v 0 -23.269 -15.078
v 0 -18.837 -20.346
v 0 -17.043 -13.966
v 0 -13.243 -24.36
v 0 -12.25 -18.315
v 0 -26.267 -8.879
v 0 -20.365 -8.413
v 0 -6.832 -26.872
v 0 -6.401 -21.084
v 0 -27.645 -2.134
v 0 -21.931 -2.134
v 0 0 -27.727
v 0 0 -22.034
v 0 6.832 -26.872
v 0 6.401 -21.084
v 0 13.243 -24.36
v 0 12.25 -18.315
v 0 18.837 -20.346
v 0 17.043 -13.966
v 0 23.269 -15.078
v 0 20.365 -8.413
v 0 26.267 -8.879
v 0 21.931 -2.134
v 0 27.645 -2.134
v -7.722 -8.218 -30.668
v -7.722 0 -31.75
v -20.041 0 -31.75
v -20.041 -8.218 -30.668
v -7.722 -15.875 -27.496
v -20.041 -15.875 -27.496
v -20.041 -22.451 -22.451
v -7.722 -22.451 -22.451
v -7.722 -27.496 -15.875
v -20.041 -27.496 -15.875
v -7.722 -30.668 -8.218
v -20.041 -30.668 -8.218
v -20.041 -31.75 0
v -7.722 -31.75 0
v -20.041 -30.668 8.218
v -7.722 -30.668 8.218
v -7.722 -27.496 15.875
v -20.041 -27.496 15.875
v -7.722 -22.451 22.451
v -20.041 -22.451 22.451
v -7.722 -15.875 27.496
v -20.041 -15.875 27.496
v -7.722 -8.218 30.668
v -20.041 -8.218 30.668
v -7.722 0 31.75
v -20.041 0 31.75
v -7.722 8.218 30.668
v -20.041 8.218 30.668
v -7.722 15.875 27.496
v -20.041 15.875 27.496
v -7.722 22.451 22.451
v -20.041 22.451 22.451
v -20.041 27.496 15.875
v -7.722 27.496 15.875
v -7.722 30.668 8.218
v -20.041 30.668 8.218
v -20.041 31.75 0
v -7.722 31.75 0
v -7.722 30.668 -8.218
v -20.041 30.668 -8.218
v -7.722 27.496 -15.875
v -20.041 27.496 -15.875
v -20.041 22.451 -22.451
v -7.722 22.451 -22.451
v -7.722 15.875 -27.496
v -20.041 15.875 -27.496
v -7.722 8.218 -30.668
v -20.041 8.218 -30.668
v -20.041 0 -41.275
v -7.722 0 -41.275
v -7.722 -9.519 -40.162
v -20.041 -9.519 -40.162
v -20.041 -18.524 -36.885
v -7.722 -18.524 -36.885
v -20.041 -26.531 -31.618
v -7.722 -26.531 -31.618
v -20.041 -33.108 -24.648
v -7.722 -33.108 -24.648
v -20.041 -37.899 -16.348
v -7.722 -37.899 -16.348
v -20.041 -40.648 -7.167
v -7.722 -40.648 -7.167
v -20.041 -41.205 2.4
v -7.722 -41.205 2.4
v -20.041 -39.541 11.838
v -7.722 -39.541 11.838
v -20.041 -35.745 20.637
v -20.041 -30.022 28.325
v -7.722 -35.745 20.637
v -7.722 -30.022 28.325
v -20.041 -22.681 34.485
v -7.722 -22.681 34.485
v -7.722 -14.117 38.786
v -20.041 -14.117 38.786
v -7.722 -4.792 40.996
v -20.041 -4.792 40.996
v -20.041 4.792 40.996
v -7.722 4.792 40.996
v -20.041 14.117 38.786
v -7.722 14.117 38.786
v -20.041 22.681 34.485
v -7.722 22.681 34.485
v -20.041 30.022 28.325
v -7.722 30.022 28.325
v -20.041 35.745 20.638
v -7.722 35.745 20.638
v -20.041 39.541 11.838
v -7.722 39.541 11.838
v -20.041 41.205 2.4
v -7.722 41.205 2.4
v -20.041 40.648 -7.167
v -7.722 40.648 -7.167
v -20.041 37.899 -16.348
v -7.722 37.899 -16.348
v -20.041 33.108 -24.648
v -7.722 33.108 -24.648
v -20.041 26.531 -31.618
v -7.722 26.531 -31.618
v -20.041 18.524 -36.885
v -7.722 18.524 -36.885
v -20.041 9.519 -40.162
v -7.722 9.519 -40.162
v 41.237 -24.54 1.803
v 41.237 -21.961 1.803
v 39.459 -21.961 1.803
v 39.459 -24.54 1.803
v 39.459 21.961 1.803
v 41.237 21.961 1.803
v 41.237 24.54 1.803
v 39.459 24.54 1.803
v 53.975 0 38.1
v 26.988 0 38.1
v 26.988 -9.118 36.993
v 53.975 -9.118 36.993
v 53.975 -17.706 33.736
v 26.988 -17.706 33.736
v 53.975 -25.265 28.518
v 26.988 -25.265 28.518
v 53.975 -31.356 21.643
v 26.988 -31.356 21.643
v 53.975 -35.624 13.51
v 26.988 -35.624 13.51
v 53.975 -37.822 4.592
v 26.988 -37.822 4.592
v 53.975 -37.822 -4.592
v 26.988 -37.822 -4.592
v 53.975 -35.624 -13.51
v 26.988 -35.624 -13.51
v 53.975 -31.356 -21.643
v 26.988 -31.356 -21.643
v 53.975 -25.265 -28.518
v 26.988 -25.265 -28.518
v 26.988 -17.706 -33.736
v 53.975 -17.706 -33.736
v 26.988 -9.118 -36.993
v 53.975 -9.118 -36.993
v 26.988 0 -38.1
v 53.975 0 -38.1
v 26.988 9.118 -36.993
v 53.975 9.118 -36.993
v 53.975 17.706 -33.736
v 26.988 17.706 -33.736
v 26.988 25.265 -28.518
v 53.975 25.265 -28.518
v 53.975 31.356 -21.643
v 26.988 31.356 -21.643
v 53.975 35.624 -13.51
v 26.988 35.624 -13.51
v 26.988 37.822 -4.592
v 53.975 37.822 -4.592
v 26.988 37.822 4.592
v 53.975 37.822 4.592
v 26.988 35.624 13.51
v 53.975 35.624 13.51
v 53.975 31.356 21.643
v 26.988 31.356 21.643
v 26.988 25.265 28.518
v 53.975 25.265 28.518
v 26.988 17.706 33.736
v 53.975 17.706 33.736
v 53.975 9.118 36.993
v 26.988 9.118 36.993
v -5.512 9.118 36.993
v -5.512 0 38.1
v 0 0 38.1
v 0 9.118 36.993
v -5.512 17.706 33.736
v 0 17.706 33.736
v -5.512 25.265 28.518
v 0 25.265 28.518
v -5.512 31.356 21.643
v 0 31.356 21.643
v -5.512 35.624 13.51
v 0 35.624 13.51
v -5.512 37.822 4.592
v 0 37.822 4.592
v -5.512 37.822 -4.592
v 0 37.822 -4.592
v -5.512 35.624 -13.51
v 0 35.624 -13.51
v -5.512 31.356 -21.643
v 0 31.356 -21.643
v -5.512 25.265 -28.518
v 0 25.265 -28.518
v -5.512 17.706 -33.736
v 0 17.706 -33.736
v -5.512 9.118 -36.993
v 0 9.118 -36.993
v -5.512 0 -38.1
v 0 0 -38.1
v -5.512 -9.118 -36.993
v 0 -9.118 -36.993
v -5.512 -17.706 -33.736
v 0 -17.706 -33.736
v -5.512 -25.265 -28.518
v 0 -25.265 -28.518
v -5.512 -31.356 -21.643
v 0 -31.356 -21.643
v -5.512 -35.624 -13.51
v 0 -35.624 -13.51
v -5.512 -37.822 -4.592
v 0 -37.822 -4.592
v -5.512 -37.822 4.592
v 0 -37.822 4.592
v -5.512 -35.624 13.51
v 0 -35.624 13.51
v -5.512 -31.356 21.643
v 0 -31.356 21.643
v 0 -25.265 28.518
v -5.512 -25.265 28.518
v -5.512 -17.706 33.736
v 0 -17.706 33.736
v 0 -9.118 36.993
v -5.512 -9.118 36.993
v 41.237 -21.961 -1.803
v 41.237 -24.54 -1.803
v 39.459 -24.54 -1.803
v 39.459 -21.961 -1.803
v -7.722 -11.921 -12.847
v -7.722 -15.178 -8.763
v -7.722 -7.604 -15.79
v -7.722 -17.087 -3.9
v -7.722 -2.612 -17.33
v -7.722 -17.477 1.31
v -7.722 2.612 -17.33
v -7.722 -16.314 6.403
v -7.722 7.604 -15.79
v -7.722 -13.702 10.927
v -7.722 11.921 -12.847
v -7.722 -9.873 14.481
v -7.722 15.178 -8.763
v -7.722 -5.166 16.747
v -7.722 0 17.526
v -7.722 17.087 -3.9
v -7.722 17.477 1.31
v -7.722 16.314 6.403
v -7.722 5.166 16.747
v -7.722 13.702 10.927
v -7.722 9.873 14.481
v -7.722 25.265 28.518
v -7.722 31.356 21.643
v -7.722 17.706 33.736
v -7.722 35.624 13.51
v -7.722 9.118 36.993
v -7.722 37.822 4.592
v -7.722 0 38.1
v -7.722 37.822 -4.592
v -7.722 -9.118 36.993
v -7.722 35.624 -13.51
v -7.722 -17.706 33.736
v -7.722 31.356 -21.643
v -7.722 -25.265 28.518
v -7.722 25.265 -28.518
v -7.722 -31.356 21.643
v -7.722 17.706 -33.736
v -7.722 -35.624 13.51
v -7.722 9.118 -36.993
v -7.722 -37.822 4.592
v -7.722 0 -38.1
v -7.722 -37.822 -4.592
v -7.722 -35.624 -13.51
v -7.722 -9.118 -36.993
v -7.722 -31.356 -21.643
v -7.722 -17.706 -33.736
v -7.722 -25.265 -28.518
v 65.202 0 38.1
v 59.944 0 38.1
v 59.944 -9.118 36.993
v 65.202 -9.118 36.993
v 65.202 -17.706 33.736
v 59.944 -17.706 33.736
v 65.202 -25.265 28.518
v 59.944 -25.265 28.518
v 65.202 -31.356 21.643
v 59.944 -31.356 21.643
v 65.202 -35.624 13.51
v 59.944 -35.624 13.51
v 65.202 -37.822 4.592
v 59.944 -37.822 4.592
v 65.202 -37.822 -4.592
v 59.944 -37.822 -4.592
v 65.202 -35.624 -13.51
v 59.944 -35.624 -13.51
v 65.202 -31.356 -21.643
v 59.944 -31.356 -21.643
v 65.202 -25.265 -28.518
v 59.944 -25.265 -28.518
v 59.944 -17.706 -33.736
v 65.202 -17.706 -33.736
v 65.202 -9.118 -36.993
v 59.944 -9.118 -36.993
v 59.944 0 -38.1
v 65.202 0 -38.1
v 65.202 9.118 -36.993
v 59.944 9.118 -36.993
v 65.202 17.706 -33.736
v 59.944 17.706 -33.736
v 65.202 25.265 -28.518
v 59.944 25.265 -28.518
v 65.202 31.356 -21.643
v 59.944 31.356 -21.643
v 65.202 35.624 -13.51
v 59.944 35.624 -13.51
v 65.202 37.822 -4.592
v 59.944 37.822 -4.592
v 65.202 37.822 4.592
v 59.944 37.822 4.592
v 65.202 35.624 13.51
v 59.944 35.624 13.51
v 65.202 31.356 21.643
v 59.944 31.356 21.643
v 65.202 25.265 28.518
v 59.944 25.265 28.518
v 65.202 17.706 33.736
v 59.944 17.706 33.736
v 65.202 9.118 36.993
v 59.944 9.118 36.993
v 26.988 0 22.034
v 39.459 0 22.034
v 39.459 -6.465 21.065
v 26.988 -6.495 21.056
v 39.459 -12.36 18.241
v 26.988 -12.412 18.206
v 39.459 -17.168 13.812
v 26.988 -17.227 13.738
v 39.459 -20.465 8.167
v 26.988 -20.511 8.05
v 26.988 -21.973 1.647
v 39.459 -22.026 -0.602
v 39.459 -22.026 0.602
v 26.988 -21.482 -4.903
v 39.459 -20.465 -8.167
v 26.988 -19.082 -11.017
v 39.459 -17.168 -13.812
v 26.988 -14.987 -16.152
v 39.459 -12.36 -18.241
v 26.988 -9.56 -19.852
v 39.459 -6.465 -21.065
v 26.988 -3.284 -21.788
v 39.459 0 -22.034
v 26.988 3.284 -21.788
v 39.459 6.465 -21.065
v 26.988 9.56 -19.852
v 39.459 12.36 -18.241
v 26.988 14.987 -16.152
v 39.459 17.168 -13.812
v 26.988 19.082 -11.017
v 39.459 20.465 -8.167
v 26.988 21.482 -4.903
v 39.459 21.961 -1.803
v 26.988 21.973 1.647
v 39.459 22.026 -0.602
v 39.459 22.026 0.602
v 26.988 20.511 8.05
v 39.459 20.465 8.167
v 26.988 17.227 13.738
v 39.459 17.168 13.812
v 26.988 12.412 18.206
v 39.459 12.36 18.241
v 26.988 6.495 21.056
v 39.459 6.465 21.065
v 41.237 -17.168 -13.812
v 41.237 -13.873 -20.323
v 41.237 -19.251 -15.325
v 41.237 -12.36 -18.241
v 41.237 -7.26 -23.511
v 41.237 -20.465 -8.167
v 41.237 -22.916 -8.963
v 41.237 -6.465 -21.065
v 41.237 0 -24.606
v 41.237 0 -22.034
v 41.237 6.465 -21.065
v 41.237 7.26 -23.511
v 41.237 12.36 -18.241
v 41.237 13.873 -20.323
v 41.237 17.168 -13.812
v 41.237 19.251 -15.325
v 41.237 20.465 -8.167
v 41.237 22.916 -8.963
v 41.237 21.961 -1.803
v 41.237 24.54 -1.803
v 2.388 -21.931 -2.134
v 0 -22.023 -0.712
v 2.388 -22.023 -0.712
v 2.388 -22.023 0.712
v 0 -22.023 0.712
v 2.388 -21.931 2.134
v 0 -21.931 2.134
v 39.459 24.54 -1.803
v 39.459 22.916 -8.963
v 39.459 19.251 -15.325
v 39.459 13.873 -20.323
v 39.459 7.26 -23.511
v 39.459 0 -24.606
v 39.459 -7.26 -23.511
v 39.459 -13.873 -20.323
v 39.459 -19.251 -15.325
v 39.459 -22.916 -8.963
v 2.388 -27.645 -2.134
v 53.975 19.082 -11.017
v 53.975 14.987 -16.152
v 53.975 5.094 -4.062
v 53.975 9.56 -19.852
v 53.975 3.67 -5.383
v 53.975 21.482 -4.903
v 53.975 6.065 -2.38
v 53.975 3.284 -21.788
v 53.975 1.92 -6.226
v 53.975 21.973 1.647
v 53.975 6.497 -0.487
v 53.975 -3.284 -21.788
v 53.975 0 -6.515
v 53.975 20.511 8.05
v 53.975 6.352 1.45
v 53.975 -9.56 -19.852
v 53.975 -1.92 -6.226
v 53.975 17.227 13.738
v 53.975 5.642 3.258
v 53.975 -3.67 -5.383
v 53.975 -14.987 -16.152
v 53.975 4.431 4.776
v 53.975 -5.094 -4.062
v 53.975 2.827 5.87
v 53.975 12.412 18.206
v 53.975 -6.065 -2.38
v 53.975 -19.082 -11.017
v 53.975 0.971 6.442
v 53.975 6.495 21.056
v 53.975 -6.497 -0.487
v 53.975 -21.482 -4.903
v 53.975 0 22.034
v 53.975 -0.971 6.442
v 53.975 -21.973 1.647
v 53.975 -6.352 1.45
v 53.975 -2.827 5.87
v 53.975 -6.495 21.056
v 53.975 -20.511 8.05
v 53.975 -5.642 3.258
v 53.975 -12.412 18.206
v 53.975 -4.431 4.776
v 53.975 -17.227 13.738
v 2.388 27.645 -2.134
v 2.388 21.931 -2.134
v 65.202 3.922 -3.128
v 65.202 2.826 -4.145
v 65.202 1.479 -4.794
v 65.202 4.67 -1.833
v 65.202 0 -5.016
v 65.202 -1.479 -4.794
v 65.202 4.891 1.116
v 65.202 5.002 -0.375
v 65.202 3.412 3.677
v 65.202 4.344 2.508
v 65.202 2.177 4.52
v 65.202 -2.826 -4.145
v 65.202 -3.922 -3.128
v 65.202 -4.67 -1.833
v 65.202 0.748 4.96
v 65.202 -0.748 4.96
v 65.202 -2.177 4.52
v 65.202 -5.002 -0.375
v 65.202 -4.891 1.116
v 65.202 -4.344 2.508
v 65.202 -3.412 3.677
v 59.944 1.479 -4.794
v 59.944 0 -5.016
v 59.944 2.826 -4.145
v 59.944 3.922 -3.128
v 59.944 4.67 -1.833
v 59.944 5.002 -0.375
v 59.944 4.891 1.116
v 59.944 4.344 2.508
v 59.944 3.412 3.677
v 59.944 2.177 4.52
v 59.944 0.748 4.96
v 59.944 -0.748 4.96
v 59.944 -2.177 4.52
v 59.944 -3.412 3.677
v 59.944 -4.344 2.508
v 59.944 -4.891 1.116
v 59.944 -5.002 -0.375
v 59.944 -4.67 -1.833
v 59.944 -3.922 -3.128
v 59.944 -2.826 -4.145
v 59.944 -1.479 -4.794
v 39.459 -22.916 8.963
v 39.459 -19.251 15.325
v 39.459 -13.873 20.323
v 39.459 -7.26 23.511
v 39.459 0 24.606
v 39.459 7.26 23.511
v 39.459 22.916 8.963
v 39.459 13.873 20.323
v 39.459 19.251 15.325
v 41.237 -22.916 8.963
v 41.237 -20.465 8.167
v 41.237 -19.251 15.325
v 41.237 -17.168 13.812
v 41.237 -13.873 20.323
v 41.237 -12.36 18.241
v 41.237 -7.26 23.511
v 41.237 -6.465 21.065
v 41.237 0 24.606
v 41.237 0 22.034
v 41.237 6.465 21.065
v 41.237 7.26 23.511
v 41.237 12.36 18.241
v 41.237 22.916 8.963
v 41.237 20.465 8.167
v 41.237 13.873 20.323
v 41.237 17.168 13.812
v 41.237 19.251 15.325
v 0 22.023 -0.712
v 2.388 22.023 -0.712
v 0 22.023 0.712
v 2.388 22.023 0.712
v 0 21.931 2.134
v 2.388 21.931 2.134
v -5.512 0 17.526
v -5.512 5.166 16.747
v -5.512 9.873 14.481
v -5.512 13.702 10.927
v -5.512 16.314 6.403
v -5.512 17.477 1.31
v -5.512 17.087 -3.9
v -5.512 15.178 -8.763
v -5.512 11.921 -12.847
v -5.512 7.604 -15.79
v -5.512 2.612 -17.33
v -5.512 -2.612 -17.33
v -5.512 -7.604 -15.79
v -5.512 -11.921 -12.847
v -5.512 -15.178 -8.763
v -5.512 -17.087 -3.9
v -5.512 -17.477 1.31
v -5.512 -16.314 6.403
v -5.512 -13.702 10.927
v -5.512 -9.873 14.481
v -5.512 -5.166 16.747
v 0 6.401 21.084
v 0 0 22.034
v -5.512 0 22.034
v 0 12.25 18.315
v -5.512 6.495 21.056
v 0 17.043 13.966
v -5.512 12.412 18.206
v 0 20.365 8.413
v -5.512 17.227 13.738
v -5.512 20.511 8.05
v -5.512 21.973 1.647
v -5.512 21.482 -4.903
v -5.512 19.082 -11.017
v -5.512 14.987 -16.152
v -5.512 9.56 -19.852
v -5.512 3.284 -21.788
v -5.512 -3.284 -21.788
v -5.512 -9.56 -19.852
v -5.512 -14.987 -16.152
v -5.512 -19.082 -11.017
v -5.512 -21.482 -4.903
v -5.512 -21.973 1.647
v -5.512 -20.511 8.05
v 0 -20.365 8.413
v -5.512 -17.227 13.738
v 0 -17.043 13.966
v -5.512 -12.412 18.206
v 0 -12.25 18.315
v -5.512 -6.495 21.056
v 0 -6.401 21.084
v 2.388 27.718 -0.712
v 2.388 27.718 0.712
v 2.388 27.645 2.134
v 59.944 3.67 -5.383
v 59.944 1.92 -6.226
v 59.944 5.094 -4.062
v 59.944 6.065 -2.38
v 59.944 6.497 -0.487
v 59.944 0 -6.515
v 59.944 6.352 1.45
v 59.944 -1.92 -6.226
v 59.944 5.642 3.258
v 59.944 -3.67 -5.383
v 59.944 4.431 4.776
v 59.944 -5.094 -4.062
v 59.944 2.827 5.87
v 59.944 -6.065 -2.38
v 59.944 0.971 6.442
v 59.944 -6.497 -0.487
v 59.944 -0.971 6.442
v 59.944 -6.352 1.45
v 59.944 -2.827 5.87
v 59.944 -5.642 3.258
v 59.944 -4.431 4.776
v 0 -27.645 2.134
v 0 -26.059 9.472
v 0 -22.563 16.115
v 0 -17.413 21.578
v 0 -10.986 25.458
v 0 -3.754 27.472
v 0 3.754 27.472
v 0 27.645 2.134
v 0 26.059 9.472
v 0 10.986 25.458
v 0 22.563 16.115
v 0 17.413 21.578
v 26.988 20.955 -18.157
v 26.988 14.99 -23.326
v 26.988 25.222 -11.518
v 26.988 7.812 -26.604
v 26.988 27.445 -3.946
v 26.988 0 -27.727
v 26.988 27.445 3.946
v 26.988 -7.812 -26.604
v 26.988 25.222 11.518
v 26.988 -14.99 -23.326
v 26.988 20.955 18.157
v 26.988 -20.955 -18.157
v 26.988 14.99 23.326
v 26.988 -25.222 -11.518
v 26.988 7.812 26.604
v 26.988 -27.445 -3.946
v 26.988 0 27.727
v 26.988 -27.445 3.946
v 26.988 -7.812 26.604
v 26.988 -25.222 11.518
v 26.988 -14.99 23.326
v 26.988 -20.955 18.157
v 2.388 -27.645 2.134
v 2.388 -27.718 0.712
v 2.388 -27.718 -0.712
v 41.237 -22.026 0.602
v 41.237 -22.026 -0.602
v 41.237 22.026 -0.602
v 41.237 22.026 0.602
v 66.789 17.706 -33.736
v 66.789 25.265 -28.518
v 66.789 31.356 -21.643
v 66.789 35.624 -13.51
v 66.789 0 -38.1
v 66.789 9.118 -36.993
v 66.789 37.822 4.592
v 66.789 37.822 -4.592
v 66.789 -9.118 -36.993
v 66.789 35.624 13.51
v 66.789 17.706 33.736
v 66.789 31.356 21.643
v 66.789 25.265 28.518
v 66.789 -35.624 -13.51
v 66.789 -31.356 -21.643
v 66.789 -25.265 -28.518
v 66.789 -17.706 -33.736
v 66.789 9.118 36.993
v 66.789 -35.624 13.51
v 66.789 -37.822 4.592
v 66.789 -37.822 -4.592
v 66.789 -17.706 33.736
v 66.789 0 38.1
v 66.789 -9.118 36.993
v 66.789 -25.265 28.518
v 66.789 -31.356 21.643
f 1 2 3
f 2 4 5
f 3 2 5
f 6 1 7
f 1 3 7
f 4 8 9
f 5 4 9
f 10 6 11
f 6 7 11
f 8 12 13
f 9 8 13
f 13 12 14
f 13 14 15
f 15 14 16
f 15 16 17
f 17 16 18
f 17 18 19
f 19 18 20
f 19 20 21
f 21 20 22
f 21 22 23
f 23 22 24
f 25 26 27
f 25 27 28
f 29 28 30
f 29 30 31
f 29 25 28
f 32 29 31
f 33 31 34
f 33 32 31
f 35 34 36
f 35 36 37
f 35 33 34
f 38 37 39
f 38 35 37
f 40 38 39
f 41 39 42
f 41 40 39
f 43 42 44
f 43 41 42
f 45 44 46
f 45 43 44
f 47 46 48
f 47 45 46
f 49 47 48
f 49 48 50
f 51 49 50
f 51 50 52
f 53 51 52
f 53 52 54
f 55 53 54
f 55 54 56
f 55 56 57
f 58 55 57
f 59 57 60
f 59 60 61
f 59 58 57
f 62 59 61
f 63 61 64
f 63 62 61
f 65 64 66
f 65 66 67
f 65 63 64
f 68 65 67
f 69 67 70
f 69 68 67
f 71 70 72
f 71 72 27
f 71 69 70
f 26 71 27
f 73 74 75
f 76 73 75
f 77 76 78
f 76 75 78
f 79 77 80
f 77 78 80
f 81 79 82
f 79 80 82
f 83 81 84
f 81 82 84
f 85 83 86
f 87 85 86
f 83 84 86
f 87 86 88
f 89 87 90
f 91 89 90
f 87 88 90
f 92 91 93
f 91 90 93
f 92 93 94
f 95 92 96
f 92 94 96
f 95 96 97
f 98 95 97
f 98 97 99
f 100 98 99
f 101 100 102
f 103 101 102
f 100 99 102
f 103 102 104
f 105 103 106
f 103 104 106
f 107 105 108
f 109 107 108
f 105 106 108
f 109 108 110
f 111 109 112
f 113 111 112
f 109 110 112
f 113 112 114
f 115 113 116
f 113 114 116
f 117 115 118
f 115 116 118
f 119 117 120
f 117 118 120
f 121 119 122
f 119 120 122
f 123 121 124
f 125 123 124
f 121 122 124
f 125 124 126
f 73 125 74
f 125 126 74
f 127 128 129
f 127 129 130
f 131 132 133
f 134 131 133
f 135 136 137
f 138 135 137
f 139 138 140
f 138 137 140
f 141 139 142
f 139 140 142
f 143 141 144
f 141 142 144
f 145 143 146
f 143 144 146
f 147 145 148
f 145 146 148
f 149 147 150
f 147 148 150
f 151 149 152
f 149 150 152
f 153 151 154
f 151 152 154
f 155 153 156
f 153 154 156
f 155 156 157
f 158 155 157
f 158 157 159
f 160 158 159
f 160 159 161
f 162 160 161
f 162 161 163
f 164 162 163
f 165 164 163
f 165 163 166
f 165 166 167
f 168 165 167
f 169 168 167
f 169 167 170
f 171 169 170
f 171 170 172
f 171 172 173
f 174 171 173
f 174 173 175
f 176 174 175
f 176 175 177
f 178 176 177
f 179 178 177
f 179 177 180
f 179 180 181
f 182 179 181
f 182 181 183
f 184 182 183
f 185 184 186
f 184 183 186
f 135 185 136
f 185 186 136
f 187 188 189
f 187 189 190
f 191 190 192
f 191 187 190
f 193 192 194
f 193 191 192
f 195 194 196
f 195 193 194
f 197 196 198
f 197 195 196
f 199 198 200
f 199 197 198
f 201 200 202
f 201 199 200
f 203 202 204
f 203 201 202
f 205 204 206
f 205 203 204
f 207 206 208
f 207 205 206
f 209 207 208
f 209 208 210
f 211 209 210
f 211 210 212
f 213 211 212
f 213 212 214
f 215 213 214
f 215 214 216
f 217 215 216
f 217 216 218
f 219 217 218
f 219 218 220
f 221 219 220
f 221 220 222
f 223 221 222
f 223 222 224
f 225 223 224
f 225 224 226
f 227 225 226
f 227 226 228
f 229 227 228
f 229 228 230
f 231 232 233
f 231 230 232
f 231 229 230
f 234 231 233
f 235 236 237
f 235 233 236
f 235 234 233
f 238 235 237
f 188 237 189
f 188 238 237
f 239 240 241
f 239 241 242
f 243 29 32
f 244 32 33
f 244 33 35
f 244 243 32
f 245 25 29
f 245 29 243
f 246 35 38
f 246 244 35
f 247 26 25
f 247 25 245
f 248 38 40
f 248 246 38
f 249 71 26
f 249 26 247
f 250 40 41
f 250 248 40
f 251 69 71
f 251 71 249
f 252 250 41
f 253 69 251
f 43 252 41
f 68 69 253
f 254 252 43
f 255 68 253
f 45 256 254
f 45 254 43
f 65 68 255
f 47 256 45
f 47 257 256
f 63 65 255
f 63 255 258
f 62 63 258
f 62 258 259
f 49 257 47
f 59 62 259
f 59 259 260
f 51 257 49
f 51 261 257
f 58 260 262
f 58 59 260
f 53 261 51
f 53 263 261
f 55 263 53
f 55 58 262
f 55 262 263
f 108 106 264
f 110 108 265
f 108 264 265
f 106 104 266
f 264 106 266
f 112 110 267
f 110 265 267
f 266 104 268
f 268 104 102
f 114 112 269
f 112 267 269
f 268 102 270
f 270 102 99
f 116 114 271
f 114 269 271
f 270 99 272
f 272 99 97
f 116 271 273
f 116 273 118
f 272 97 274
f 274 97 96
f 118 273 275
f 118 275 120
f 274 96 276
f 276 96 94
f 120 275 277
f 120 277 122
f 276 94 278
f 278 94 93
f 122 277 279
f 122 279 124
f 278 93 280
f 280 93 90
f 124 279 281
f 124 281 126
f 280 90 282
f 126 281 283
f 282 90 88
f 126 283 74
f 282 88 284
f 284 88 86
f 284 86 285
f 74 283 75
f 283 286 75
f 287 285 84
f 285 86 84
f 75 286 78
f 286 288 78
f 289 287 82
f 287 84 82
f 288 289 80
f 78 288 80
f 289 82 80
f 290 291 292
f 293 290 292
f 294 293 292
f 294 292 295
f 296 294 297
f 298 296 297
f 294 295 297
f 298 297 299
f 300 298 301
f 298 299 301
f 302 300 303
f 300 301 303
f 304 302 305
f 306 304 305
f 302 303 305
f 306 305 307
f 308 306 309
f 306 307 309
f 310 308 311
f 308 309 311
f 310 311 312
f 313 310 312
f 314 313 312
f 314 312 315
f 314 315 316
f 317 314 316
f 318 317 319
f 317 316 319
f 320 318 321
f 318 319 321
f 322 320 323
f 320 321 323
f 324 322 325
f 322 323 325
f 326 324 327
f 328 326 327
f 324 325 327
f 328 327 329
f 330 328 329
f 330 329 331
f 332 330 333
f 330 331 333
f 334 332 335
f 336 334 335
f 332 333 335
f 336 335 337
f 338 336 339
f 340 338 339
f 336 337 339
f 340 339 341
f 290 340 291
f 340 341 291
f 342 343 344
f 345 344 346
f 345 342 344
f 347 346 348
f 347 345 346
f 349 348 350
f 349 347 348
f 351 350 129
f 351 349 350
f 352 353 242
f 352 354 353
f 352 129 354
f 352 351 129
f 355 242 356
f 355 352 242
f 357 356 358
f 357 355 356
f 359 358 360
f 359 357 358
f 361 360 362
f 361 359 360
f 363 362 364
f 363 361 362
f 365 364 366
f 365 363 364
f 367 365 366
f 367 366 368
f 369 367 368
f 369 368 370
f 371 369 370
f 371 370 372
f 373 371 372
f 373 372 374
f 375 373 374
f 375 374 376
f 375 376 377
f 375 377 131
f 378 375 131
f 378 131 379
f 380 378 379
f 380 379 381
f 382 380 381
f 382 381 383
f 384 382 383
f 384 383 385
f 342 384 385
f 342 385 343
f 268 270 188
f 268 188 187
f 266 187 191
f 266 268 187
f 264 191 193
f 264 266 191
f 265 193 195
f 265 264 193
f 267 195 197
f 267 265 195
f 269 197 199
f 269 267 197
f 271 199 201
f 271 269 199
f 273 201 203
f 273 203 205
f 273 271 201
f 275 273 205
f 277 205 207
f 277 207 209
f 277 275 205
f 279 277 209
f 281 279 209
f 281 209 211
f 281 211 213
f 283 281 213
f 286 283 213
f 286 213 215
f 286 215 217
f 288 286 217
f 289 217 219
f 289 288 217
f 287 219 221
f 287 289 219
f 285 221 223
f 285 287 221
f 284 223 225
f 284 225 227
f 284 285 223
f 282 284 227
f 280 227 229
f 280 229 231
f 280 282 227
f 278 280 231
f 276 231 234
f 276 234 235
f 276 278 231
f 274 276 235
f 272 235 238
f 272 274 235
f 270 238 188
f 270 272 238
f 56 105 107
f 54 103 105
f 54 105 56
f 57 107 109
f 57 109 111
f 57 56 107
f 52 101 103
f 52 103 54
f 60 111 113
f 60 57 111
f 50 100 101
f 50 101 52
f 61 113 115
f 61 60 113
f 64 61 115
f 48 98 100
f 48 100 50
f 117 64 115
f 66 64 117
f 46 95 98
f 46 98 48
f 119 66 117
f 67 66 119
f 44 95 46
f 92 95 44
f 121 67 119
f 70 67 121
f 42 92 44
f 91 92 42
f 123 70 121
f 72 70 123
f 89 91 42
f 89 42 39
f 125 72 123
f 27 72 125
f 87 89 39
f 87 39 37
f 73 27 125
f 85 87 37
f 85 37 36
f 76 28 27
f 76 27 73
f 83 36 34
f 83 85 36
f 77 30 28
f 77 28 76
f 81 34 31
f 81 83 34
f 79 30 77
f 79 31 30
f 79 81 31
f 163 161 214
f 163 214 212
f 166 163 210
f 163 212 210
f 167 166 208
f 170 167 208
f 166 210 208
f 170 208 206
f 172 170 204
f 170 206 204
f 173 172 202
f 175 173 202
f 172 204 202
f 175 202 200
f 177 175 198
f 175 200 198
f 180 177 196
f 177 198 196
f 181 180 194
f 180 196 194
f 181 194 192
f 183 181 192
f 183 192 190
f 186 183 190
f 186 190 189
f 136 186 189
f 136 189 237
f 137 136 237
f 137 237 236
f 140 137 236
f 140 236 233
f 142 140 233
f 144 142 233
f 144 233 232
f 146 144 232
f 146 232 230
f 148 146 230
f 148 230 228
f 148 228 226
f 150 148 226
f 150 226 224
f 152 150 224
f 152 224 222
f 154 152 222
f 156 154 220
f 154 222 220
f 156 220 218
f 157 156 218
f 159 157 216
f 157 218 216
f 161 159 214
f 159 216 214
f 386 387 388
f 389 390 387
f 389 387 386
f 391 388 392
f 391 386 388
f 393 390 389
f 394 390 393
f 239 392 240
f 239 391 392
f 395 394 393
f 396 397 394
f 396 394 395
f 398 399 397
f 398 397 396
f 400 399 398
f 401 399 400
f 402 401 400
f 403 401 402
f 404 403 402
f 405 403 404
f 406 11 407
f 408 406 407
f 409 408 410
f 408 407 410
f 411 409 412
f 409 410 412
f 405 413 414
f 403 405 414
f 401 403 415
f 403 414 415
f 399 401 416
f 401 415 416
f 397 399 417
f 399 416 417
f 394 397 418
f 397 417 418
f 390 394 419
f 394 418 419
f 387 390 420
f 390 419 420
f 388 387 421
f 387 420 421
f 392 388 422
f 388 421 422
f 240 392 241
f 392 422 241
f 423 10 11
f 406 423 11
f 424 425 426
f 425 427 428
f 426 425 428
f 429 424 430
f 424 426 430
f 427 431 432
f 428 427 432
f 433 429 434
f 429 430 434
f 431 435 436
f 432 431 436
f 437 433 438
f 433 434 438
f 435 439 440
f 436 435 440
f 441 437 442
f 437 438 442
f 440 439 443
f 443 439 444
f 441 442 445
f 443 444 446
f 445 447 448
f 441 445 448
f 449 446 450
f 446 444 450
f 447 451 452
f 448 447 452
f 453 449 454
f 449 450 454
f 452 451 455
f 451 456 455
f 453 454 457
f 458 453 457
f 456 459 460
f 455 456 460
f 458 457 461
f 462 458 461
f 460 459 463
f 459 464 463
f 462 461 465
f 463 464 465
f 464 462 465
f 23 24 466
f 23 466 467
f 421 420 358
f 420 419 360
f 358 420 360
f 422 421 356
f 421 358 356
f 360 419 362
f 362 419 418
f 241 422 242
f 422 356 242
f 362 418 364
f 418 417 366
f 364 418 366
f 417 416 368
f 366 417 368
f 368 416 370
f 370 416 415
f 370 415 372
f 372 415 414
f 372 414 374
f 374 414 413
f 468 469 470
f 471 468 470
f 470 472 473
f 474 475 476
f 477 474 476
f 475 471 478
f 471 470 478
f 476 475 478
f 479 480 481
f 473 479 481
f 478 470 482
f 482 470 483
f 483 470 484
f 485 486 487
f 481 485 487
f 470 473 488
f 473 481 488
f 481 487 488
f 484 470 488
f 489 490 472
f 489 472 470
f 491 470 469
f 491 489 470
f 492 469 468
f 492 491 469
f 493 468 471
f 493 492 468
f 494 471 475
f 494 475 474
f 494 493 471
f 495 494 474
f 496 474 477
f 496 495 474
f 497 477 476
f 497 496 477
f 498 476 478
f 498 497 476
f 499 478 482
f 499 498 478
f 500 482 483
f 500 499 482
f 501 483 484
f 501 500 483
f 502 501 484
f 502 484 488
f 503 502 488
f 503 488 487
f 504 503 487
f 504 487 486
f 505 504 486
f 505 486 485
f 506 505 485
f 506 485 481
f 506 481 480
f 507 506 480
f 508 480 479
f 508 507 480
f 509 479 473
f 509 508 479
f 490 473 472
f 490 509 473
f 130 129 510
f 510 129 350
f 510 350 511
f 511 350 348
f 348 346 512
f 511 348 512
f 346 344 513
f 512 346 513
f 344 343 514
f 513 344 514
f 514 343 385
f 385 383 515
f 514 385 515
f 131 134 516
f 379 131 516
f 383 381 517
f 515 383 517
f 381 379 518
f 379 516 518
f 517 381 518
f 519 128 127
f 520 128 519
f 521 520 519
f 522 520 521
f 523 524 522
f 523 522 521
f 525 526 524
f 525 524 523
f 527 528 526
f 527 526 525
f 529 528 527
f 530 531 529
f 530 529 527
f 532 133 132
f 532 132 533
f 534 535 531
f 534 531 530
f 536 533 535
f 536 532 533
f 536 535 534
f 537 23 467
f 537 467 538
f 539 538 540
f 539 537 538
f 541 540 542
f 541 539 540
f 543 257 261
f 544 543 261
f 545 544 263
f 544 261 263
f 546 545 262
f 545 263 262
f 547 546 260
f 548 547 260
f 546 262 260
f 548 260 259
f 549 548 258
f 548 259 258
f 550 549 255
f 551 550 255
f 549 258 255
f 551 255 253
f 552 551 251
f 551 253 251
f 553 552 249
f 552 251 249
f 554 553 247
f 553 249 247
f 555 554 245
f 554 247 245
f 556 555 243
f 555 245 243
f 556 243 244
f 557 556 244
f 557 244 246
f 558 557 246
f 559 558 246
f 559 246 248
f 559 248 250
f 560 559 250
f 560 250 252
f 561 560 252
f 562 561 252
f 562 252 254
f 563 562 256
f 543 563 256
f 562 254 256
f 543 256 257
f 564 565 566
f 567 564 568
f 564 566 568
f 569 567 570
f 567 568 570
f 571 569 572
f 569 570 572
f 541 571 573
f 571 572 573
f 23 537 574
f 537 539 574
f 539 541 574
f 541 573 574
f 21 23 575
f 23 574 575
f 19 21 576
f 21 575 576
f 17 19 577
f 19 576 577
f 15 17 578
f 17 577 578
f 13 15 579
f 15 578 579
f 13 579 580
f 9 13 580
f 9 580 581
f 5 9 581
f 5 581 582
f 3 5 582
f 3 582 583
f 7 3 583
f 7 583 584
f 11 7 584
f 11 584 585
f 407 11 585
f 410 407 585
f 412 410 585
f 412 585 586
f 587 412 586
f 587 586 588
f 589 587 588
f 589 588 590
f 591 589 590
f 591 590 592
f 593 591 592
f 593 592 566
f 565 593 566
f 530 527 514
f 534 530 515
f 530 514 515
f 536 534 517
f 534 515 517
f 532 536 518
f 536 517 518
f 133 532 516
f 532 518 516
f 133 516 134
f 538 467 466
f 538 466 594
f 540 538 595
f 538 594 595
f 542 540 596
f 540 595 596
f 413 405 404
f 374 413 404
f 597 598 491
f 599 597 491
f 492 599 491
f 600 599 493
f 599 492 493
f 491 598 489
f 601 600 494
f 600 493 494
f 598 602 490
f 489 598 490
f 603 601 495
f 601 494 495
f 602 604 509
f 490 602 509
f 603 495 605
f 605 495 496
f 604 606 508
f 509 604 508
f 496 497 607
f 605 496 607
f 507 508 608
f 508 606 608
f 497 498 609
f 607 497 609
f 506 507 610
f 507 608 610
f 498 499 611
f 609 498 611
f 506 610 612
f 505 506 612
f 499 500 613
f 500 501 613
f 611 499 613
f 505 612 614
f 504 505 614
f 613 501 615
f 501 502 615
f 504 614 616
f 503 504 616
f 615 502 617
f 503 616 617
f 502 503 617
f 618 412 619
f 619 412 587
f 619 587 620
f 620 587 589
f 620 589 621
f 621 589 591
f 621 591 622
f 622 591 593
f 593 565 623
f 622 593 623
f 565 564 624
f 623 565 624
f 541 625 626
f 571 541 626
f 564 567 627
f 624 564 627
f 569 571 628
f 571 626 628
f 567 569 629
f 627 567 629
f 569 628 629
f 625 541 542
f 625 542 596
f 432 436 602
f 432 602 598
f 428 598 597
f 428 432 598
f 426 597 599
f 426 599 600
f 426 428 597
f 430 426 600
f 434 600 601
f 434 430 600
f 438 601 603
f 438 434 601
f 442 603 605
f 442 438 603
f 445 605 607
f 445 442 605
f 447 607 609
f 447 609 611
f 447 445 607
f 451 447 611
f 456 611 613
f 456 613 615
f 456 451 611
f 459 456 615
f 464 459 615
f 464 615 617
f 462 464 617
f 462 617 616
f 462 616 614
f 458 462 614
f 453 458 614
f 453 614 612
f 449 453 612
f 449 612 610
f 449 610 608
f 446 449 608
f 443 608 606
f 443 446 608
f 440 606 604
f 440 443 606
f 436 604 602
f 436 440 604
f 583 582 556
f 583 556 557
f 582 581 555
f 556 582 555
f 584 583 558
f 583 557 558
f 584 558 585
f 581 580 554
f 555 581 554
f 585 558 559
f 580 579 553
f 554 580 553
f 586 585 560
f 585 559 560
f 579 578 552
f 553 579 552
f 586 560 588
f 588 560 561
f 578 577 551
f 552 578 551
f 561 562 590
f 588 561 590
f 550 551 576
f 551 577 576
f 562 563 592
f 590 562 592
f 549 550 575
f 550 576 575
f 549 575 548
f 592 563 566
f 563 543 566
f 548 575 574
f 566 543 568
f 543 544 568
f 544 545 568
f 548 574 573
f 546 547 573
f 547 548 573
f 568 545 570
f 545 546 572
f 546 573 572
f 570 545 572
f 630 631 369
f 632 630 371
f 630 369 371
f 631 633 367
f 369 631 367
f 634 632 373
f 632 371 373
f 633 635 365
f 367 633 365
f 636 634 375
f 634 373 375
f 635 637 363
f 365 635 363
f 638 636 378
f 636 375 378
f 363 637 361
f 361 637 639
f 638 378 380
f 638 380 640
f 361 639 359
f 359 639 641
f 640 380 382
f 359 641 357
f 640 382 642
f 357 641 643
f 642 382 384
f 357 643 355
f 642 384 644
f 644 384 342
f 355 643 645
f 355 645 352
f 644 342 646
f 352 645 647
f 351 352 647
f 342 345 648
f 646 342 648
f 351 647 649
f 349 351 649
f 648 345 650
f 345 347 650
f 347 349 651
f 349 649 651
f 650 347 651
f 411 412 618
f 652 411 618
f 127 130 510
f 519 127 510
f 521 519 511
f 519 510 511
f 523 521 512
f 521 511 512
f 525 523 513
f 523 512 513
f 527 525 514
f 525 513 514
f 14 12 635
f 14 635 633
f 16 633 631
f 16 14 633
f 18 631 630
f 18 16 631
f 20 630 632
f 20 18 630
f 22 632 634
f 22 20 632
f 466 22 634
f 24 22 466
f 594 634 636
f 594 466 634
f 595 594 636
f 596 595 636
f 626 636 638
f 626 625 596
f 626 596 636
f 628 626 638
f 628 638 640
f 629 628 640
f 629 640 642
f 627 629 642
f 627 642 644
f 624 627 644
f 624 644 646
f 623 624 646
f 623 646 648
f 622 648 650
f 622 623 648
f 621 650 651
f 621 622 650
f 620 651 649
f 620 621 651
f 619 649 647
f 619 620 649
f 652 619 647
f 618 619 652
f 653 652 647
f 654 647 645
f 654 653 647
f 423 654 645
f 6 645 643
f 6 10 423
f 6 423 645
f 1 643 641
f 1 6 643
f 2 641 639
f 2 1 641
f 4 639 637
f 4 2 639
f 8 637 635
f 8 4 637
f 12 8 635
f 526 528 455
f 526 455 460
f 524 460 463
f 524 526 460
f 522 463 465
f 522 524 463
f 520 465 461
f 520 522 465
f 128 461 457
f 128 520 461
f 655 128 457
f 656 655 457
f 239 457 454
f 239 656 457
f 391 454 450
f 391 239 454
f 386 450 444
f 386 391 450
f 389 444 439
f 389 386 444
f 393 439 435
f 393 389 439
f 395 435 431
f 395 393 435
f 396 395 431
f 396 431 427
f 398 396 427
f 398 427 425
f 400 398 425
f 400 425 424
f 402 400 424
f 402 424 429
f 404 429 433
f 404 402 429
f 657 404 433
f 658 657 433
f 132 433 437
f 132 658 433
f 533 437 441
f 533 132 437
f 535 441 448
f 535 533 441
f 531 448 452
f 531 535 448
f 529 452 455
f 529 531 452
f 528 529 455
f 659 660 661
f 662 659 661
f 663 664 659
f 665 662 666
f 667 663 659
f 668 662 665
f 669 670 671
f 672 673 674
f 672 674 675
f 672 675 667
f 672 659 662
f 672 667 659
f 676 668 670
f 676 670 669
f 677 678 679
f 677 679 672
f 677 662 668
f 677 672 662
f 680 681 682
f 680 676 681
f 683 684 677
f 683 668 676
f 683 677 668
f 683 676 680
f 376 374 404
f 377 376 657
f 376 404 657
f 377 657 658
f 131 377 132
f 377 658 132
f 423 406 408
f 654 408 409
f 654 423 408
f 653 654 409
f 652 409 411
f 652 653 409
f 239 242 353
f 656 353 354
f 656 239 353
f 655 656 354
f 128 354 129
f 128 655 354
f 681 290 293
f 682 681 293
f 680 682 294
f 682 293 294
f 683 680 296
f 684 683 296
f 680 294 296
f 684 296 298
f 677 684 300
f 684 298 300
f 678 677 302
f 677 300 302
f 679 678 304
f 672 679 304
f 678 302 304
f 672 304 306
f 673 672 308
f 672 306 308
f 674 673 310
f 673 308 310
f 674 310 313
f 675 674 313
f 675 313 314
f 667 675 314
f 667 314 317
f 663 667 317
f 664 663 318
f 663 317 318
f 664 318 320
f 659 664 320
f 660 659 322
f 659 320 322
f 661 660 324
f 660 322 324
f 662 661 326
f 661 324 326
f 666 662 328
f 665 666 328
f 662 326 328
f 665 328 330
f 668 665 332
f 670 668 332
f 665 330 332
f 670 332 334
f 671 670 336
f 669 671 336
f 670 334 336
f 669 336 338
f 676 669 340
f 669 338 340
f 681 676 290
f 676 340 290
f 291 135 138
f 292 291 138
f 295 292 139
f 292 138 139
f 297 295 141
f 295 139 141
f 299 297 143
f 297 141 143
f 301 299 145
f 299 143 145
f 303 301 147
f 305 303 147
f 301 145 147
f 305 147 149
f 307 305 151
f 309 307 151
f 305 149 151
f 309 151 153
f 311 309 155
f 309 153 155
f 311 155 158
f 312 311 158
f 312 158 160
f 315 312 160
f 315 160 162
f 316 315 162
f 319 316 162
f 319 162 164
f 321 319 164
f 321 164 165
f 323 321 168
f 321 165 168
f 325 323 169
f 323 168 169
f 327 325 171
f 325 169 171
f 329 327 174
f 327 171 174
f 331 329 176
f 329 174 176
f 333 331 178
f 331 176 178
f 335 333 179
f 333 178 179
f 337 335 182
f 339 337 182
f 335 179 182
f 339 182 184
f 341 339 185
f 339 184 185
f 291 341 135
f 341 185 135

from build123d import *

# Parameters (mm, degrees)
SKETCH1_R            = 38.1
SKETCH1_R_2          = 27.727172307
BOSS_EXTRUDE1_DEPTH  = 26.9875
BOSS_EXTRUDE2_START  = 5.5118
SKETCH2_R            = 38.1
SKETCH2_R_2          = 22.0345
BOSS_EXTRUDE2_DEPTH  = 5.5118
SKETCH3_R            = 38.1
SKETCH3_R_2          = 22.0345
BOSS_EXTRUDE3_DEPTH  = 26.9875
BOSS_EXTRUDE4_DEPTH  = 2.3876
BOSS_EXTRUDE5_START  = 2.2098
SKETCH5_R            = 38.1
SKETCH5_R_2          = 17.526
BOSS_EXTRUDE5_DEPTH  = 2.2098
SKETCH7_R            = 24.60625
CUT_EXTRUDE1_DEPTH   = 1.778
SKETCH8_R            = 38.1
SKETCH8_R_2          = 6.5151
BOSS_EXTRUDE6_DEPTH  = 5.969
SKETCH9_R            = 38.1
SKETCH9_R_2          = 5.0165
BOSS_EXTRUDE7_DEPTH  = 5.2578
SKETCH10_R           = 38.1
BOSS_EXTRUDE8_DEPTH  = 1.5875
BOSS_EXTRUDE9_REACH  = 74.802
SKETCH12_R           = 41.275
SKETCH12_R_2         = 31.75
BOSS_EXTRUDE10_DEPTH = 12.319


with BuildPart() as part:
    # Sketch1 → Boss-Extrude1 (new body)
    with BuildSketch(Plane(origin=(0, 0, 0), x_dir=(0, 0, -1), z_dir=(1, 0, 0))):
        Circle(SKETCH1_R)
        Circle(SKETCH1_R_2, mode=Mode.SUBTRACT)
    extrude(amount=BOSS_EXTRUDE1_DEPTH)

    # Sketch2 → Boss-Extrude2 (add)
    with BuildSketch(Plane.ZY.offset(BOSS_EXTRUDE2_START)):
        Circle(SKETCH2_R)
        Circle(SKETCH2_R_2, mode=Mode.SUBTRACT)
    extrude(amount=-BOSS_EXTRUDE2_DEPTH)

    # Sketch3 → Boss-Extrude3 (add)
    with BuildSketch(Plane(origin=(26.9875, 0, 0), x_dir=(0, 0, -1), z_dir=(1, 0, 0))):
        with Locations(Location((0, 0, 0), (0, 0, 180))):
            Circle(SKETCH3_R)
        with Locations(Location((0, 0, 0), (0, 0, 180))):
            Circle(SKETCH3_R_2, mode=Mode.SUBTRACT)
    extrude(amount=BOSS_EXTRUDE3_DEPTH)

    # Sketch4 → Boss-Extrude4 (add)
    with BuildSketch(Plane(origin=(0, 0, 0), x_dir=(0, 0, -1), z_dir=(1, 0, 0))):
        with BuildLine():
            Line((-2.1336, 21.930958513), (-2.1336, 27.727172307))
            Line((-2.1336, 27.727172307), (2.1336, 27.727172307))
            Line((2.1336, 27.727172307), (2.1336, 21.930958513))
            ThreePointArc((2.1336, 21.930958513), (0, 22.0345), (-2.1336, 21.930958513))
        make_face()
    boss_extrude4 = extrude(amount=BOSS_EXTRUDE4_DEPTH)

    # Mirror1: Boss-Extrude4 across plane
    add(boss_extrude4.mirror(Plane.ZX))

    # Sketch5 → Boss-Extrude5 (add)
    with BuildSketch(Plane.ZY.offset(5.5118).offset(BOSS_EXTRUDE5_START)):
        Circle(SKETCH5_R)
        Circle(SKETCH5_R_2, mode=Mode.SUBTRACT)
    extrude(amount=-BOSS_EXTRUDE5_DEPTH)

    # Sketch7 → Cut-Extrude1 (cut)
    with BuildSketch(Plane.ZY.offset(-39.4589)):
        Circle(SKETCH7_R)
    extrude(amount=-CUT_EXTRUDE1_DEPTH, mode=Mode.SUBTRACT)

    # Sketch8 → Boss-Extrude6 (add)
    with BuildSketch(Plane(origin=(53.975, 0, 0), x_dir=(0, 0, -1), z_dir=(1, 0, 0))):
        with Locations(Location((0, 0, 0), (0, 0, 180))):
            Circle(SKETCH8_R)
        Circle(SKETCH8_R_2, mode=Mode.SUBTRACT)
    extrude(amount=BOSS_EXTRUDE6_DEPTH)

    # Sketch9 → Boss-Extrude7 (add)
    with BuildSketch(Plane(origin=(59.944, 0, 0), x_dir=(0, 0, -1), z_dir=(1, 0, 0))):
        with Locations(Location((0, 0, 0), (0, 0, 180))):
            Circle(SKETCH9_R)
        Circle(SKETCH9_R_2, mode=Mode.SUBTRACT)
    extrude(amount=BOSS_EXTRUDE7_DEPTH)

    # Sketch10 → Boss-Extrude8 (add)
    with BuildSketch(Plane(origin=(65.2018, 0, 0), x_dir=(0, 0, -1), z_dir=(1, 0, 0))):
        with Locations(Location((0, 0, 0), (0, 0, 180))):
            Circle(SKETCH10_R)
    extrude(amount=BOSS_EXTRUDE8_DEPTH)

    # Sketch11 → Boss-Extrude9 (add, up to next)
    with BuildSketch(Plane.ZY.offset(-41.2369), mode=Mode.PRIVATE) as boss_extrude9_sk1:
        with BuildLine():
            Line((1.8034, -21.960576921), (1.8034, -24.60625))
            Line((1.8034, -24.60625), (-1.8034, -24.60625))
            Line((-1.8034, -24.60625), (-1.8034, -21.960576921))
            ThreePointArc((-1.8034, -21.960576921), (0, -22.0345), (1.8034, -21.960576921))
        make_face()
    boss_extrude9_tool1 = extrude(boss_extrude9_sk1.sketch, amount=BOSS_EXTRUDE9_REACH, mode=Mode.PRIVATE) - part.part
    boss_extrude9 = boss_extrude9_tool1.solids().sort_by_distance((41.2369, -23.307969, 0))[0]
    add(boss_extrude9)

    # Mirror2: Boss-Extrude9 across plane
    add(boss_extrude9.mirror(Plane.ZX))

    # Sketch12 → Boss-Extrude10 (add)
    with BuildSketch(Plane.ZY.offset(7.7216)):
        with Locations(Location((0, 0, 0), (0, 0, 180))):
            Circle(SKETCH12_R)
        with Locations(Location((0, 0, 0), (0, 0, 180))):
            Circle(SKETCH12_R_2, mode=Mode.SUBTRACT)
    extrude(amount=BOSS_EXTRUDE10_DEPTH)


solid = part.part
